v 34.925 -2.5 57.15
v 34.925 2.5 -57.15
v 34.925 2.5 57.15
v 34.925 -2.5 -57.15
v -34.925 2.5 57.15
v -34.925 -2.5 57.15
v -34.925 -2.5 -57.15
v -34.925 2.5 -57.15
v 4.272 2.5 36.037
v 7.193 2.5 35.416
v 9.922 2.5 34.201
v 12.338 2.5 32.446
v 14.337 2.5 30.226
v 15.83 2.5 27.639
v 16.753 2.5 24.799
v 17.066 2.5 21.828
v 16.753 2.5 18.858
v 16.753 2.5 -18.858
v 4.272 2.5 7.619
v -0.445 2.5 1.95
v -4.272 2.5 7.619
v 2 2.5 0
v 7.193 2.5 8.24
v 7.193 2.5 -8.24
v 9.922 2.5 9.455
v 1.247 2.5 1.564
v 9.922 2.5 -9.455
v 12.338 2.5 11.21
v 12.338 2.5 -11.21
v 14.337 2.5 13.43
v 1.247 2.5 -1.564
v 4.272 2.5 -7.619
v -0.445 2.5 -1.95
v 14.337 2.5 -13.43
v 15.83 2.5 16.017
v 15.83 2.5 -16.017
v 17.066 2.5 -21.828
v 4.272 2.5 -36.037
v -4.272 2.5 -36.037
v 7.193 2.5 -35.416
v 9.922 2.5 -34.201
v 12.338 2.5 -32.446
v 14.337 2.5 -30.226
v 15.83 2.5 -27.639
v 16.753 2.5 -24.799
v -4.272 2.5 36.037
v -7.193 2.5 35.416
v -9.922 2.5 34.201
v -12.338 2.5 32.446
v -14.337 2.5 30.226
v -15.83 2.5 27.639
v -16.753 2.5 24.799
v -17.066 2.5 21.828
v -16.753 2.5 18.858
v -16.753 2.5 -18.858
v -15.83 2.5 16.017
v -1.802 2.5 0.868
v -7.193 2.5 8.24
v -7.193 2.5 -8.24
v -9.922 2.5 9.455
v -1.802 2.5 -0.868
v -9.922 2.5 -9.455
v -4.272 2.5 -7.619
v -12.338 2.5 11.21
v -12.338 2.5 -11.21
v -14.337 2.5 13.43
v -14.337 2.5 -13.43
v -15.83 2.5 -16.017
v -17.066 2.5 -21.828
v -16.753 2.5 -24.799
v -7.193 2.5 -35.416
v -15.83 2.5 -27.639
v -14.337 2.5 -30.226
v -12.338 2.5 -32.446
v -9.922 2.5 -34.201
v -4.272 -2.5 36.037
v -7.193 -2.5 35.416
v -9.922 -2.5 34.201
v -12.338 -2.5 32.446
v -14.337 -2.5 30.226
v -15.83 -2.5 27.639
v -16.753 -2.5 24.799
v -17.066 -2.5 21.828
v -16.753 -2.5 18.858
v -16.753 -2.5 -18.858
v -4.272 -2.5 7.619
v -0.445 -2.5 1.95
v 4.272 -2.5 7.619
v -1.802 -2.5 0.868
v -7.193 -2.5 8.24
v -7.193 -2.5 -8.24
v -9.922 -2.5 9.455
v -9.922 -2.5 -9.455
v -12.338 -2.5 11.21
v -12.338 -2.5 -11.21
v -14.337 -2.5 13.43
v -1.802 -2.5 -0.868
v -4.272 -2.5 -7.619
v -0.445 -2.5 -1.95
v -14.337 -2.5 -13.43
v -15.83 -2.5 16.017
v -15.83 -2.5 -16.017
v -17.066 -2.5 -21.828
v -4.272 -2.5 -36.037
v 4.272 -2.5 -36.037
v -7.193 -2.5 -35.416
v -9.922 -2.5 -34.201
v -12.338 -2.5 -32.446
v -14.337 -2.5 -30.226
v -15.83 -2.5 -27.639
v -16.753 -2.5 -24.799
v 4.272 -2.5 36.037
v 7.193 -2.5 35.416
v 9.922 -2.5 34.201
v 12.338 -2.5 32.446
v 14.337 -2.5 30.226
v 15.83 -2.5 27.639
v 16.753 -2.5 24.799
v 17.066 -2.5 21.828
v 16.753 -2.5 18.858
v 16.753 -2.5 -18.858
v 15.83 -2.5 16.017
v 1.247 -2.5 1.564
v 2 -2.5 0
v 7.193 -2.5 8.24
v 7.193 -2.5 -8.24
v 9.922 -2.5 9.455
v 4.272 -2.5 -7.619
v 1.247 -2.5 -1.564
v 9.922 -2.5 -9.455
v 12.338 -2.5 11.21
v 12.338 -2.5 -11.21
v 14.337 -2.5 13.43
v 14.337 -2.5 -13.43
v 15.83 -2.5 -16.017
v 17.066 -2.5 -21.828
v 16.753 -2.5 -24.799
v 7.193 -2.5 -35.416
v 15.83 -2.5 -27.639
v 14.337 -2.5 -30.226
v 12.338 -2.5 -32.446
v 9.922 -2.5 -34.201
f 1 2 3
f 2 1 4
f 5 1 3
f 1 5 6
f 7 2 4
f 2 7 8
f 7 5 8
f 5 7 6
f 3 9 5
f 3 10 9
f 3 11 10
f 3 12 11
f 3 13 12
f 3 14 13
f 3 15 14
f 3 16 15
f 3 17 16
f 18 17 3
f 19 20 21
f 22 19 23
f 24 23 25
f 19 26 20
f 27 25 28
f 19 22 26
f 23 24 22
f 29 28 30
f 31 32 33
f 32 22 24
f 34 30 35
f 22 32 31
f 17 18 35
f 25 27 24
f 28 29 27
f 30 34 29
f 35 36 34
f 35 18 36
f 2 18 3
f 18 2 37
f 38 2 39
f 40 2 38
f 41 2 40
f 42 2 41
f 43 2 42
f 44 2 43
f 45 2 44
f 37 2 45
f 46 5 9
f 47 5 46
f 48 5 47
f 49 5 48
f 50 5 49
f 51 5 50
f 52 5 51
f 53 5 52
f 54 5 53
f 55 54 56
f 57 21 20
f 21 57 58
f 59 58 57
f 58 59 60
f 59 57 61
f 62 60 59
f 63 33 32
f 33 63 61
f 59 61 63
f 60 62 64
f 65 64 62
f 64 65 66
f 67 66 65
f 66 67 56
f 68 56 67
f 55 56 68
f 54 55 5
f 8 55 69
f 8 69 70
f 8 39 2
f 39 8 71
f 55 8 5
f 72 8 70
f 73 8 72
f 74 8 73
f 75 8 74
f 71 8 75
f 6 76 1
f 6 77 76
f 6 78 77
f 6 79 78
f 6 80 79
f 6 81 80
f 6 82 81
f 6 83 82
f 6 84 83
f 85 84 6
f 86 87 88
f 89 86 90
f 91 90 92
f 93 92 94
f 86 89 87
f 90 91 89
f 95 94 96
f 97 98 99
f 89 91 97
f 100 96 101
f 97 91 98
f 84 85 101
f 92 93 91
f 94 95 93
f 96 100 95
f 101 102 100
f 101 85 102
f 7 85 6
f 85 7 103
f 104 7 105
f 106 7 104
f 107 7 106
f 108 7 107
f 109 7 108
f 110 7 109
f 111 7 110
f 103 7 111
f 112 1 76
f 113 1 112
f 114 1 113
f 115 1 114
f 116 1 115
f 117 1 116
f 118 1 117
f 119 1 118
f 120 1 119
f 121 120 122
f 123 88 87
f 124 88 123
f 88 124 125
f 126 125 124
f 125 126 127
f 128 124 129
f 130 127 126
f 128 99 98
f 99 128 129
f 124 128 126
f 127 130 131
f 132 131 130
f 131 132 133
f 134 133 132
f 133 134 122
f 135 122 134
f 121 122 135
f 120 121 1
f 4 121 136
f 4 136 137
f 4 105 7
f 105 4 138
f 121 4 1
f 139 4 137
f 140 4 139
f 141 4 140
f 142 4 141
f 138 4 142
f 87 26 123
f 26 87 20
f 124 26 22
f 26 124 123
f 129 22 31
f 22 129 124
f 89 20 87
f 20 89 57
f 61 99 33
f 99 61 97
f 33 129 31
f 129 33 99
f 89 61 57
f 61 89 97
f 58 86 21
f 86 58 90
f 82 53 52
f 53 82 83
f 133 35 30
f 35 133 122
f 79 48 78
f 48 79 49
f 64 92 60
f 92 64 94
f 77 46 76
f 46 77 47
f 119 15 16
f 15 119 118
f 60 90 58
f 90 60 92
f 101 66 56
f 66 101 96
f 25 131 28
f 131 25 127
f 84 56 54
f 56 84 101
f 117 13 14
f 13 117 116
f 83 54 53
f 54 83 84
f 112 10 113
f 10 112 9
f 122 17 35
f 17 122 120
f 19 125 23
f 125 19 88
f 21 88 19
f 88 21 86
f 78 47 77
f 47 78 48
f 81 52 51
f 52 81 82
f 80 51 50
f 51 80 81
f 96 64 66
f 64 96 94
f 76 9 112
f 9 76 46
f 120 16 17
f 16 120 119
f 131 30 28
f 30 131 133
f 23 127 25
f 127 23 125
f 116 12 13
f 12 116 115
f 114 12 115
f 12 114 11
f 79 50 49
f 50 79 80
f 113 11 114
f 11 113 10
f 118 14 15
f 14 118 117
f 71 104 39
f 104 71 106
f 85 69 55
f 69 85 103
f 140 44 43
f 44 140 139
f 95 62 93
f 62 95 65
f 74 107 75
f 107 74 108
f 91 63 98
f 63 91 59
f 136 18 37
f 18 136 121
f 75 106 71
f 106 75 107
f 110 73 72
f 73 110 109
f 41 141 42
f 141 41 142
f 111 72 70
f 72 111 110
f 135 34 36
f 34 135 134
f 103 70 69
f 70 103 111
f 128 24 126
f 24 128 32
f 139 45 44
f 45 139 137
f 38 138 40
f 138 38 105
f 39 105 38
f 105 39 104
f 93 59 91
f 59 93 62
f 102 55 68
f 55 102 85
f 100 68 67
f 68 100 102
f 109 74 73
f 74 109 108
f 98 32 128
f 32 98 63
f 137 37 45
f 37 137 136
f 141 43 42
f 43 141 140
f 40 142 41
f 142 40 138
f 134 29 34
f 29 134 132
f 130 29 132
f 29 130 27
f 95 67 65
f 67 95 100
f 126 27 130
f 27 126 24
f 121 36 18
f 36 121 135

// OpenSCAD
// https://www.archtoolbox.com/materials-systems/electrical/electricalfaceplates.html
width = 2.75*25.4; //  2-3/4" => mm
height = 4.5*25.4; // 4-1/2" => mm
thickness = 5;
_depth = thickness + 1;

electrical_opening_w = (1+11/32)*25.4; // 1-11/32" => mm
electrical_opening_h = 1.125*25.4; // 1-1/4" => mm
electrical_opening_diff = electrical_opening_w - electrical_opening_h;

module electrical_opening() {
    rotate(a=90, v=[1, 0, 0]) {
        hull() {
            translate([-electrical_opening_diff / 2, 0, 0])
              cylinder(d=electrical_opening_h, h=_depth, center=true);
            translate([ electrical_opening_diff / 2, 0, 0])
              cylinder(d=electrical_opening_h, h=_depth, center=true);
        }
    }
}

screw_opening_d = 4;

module screw_opening() {
    rotate(a=90, v=[1, 0, 0])
      cylinder(d=screw_opening_d, h=_depth, center=true);
}

difference() {
    cube([width, thickness, height], center = true);
    screw_opening();
    translate([0, 0,  width/3.2]) electrical_opening();
    translate([0, 0, -width/3.2]) electrical_opening();
}
